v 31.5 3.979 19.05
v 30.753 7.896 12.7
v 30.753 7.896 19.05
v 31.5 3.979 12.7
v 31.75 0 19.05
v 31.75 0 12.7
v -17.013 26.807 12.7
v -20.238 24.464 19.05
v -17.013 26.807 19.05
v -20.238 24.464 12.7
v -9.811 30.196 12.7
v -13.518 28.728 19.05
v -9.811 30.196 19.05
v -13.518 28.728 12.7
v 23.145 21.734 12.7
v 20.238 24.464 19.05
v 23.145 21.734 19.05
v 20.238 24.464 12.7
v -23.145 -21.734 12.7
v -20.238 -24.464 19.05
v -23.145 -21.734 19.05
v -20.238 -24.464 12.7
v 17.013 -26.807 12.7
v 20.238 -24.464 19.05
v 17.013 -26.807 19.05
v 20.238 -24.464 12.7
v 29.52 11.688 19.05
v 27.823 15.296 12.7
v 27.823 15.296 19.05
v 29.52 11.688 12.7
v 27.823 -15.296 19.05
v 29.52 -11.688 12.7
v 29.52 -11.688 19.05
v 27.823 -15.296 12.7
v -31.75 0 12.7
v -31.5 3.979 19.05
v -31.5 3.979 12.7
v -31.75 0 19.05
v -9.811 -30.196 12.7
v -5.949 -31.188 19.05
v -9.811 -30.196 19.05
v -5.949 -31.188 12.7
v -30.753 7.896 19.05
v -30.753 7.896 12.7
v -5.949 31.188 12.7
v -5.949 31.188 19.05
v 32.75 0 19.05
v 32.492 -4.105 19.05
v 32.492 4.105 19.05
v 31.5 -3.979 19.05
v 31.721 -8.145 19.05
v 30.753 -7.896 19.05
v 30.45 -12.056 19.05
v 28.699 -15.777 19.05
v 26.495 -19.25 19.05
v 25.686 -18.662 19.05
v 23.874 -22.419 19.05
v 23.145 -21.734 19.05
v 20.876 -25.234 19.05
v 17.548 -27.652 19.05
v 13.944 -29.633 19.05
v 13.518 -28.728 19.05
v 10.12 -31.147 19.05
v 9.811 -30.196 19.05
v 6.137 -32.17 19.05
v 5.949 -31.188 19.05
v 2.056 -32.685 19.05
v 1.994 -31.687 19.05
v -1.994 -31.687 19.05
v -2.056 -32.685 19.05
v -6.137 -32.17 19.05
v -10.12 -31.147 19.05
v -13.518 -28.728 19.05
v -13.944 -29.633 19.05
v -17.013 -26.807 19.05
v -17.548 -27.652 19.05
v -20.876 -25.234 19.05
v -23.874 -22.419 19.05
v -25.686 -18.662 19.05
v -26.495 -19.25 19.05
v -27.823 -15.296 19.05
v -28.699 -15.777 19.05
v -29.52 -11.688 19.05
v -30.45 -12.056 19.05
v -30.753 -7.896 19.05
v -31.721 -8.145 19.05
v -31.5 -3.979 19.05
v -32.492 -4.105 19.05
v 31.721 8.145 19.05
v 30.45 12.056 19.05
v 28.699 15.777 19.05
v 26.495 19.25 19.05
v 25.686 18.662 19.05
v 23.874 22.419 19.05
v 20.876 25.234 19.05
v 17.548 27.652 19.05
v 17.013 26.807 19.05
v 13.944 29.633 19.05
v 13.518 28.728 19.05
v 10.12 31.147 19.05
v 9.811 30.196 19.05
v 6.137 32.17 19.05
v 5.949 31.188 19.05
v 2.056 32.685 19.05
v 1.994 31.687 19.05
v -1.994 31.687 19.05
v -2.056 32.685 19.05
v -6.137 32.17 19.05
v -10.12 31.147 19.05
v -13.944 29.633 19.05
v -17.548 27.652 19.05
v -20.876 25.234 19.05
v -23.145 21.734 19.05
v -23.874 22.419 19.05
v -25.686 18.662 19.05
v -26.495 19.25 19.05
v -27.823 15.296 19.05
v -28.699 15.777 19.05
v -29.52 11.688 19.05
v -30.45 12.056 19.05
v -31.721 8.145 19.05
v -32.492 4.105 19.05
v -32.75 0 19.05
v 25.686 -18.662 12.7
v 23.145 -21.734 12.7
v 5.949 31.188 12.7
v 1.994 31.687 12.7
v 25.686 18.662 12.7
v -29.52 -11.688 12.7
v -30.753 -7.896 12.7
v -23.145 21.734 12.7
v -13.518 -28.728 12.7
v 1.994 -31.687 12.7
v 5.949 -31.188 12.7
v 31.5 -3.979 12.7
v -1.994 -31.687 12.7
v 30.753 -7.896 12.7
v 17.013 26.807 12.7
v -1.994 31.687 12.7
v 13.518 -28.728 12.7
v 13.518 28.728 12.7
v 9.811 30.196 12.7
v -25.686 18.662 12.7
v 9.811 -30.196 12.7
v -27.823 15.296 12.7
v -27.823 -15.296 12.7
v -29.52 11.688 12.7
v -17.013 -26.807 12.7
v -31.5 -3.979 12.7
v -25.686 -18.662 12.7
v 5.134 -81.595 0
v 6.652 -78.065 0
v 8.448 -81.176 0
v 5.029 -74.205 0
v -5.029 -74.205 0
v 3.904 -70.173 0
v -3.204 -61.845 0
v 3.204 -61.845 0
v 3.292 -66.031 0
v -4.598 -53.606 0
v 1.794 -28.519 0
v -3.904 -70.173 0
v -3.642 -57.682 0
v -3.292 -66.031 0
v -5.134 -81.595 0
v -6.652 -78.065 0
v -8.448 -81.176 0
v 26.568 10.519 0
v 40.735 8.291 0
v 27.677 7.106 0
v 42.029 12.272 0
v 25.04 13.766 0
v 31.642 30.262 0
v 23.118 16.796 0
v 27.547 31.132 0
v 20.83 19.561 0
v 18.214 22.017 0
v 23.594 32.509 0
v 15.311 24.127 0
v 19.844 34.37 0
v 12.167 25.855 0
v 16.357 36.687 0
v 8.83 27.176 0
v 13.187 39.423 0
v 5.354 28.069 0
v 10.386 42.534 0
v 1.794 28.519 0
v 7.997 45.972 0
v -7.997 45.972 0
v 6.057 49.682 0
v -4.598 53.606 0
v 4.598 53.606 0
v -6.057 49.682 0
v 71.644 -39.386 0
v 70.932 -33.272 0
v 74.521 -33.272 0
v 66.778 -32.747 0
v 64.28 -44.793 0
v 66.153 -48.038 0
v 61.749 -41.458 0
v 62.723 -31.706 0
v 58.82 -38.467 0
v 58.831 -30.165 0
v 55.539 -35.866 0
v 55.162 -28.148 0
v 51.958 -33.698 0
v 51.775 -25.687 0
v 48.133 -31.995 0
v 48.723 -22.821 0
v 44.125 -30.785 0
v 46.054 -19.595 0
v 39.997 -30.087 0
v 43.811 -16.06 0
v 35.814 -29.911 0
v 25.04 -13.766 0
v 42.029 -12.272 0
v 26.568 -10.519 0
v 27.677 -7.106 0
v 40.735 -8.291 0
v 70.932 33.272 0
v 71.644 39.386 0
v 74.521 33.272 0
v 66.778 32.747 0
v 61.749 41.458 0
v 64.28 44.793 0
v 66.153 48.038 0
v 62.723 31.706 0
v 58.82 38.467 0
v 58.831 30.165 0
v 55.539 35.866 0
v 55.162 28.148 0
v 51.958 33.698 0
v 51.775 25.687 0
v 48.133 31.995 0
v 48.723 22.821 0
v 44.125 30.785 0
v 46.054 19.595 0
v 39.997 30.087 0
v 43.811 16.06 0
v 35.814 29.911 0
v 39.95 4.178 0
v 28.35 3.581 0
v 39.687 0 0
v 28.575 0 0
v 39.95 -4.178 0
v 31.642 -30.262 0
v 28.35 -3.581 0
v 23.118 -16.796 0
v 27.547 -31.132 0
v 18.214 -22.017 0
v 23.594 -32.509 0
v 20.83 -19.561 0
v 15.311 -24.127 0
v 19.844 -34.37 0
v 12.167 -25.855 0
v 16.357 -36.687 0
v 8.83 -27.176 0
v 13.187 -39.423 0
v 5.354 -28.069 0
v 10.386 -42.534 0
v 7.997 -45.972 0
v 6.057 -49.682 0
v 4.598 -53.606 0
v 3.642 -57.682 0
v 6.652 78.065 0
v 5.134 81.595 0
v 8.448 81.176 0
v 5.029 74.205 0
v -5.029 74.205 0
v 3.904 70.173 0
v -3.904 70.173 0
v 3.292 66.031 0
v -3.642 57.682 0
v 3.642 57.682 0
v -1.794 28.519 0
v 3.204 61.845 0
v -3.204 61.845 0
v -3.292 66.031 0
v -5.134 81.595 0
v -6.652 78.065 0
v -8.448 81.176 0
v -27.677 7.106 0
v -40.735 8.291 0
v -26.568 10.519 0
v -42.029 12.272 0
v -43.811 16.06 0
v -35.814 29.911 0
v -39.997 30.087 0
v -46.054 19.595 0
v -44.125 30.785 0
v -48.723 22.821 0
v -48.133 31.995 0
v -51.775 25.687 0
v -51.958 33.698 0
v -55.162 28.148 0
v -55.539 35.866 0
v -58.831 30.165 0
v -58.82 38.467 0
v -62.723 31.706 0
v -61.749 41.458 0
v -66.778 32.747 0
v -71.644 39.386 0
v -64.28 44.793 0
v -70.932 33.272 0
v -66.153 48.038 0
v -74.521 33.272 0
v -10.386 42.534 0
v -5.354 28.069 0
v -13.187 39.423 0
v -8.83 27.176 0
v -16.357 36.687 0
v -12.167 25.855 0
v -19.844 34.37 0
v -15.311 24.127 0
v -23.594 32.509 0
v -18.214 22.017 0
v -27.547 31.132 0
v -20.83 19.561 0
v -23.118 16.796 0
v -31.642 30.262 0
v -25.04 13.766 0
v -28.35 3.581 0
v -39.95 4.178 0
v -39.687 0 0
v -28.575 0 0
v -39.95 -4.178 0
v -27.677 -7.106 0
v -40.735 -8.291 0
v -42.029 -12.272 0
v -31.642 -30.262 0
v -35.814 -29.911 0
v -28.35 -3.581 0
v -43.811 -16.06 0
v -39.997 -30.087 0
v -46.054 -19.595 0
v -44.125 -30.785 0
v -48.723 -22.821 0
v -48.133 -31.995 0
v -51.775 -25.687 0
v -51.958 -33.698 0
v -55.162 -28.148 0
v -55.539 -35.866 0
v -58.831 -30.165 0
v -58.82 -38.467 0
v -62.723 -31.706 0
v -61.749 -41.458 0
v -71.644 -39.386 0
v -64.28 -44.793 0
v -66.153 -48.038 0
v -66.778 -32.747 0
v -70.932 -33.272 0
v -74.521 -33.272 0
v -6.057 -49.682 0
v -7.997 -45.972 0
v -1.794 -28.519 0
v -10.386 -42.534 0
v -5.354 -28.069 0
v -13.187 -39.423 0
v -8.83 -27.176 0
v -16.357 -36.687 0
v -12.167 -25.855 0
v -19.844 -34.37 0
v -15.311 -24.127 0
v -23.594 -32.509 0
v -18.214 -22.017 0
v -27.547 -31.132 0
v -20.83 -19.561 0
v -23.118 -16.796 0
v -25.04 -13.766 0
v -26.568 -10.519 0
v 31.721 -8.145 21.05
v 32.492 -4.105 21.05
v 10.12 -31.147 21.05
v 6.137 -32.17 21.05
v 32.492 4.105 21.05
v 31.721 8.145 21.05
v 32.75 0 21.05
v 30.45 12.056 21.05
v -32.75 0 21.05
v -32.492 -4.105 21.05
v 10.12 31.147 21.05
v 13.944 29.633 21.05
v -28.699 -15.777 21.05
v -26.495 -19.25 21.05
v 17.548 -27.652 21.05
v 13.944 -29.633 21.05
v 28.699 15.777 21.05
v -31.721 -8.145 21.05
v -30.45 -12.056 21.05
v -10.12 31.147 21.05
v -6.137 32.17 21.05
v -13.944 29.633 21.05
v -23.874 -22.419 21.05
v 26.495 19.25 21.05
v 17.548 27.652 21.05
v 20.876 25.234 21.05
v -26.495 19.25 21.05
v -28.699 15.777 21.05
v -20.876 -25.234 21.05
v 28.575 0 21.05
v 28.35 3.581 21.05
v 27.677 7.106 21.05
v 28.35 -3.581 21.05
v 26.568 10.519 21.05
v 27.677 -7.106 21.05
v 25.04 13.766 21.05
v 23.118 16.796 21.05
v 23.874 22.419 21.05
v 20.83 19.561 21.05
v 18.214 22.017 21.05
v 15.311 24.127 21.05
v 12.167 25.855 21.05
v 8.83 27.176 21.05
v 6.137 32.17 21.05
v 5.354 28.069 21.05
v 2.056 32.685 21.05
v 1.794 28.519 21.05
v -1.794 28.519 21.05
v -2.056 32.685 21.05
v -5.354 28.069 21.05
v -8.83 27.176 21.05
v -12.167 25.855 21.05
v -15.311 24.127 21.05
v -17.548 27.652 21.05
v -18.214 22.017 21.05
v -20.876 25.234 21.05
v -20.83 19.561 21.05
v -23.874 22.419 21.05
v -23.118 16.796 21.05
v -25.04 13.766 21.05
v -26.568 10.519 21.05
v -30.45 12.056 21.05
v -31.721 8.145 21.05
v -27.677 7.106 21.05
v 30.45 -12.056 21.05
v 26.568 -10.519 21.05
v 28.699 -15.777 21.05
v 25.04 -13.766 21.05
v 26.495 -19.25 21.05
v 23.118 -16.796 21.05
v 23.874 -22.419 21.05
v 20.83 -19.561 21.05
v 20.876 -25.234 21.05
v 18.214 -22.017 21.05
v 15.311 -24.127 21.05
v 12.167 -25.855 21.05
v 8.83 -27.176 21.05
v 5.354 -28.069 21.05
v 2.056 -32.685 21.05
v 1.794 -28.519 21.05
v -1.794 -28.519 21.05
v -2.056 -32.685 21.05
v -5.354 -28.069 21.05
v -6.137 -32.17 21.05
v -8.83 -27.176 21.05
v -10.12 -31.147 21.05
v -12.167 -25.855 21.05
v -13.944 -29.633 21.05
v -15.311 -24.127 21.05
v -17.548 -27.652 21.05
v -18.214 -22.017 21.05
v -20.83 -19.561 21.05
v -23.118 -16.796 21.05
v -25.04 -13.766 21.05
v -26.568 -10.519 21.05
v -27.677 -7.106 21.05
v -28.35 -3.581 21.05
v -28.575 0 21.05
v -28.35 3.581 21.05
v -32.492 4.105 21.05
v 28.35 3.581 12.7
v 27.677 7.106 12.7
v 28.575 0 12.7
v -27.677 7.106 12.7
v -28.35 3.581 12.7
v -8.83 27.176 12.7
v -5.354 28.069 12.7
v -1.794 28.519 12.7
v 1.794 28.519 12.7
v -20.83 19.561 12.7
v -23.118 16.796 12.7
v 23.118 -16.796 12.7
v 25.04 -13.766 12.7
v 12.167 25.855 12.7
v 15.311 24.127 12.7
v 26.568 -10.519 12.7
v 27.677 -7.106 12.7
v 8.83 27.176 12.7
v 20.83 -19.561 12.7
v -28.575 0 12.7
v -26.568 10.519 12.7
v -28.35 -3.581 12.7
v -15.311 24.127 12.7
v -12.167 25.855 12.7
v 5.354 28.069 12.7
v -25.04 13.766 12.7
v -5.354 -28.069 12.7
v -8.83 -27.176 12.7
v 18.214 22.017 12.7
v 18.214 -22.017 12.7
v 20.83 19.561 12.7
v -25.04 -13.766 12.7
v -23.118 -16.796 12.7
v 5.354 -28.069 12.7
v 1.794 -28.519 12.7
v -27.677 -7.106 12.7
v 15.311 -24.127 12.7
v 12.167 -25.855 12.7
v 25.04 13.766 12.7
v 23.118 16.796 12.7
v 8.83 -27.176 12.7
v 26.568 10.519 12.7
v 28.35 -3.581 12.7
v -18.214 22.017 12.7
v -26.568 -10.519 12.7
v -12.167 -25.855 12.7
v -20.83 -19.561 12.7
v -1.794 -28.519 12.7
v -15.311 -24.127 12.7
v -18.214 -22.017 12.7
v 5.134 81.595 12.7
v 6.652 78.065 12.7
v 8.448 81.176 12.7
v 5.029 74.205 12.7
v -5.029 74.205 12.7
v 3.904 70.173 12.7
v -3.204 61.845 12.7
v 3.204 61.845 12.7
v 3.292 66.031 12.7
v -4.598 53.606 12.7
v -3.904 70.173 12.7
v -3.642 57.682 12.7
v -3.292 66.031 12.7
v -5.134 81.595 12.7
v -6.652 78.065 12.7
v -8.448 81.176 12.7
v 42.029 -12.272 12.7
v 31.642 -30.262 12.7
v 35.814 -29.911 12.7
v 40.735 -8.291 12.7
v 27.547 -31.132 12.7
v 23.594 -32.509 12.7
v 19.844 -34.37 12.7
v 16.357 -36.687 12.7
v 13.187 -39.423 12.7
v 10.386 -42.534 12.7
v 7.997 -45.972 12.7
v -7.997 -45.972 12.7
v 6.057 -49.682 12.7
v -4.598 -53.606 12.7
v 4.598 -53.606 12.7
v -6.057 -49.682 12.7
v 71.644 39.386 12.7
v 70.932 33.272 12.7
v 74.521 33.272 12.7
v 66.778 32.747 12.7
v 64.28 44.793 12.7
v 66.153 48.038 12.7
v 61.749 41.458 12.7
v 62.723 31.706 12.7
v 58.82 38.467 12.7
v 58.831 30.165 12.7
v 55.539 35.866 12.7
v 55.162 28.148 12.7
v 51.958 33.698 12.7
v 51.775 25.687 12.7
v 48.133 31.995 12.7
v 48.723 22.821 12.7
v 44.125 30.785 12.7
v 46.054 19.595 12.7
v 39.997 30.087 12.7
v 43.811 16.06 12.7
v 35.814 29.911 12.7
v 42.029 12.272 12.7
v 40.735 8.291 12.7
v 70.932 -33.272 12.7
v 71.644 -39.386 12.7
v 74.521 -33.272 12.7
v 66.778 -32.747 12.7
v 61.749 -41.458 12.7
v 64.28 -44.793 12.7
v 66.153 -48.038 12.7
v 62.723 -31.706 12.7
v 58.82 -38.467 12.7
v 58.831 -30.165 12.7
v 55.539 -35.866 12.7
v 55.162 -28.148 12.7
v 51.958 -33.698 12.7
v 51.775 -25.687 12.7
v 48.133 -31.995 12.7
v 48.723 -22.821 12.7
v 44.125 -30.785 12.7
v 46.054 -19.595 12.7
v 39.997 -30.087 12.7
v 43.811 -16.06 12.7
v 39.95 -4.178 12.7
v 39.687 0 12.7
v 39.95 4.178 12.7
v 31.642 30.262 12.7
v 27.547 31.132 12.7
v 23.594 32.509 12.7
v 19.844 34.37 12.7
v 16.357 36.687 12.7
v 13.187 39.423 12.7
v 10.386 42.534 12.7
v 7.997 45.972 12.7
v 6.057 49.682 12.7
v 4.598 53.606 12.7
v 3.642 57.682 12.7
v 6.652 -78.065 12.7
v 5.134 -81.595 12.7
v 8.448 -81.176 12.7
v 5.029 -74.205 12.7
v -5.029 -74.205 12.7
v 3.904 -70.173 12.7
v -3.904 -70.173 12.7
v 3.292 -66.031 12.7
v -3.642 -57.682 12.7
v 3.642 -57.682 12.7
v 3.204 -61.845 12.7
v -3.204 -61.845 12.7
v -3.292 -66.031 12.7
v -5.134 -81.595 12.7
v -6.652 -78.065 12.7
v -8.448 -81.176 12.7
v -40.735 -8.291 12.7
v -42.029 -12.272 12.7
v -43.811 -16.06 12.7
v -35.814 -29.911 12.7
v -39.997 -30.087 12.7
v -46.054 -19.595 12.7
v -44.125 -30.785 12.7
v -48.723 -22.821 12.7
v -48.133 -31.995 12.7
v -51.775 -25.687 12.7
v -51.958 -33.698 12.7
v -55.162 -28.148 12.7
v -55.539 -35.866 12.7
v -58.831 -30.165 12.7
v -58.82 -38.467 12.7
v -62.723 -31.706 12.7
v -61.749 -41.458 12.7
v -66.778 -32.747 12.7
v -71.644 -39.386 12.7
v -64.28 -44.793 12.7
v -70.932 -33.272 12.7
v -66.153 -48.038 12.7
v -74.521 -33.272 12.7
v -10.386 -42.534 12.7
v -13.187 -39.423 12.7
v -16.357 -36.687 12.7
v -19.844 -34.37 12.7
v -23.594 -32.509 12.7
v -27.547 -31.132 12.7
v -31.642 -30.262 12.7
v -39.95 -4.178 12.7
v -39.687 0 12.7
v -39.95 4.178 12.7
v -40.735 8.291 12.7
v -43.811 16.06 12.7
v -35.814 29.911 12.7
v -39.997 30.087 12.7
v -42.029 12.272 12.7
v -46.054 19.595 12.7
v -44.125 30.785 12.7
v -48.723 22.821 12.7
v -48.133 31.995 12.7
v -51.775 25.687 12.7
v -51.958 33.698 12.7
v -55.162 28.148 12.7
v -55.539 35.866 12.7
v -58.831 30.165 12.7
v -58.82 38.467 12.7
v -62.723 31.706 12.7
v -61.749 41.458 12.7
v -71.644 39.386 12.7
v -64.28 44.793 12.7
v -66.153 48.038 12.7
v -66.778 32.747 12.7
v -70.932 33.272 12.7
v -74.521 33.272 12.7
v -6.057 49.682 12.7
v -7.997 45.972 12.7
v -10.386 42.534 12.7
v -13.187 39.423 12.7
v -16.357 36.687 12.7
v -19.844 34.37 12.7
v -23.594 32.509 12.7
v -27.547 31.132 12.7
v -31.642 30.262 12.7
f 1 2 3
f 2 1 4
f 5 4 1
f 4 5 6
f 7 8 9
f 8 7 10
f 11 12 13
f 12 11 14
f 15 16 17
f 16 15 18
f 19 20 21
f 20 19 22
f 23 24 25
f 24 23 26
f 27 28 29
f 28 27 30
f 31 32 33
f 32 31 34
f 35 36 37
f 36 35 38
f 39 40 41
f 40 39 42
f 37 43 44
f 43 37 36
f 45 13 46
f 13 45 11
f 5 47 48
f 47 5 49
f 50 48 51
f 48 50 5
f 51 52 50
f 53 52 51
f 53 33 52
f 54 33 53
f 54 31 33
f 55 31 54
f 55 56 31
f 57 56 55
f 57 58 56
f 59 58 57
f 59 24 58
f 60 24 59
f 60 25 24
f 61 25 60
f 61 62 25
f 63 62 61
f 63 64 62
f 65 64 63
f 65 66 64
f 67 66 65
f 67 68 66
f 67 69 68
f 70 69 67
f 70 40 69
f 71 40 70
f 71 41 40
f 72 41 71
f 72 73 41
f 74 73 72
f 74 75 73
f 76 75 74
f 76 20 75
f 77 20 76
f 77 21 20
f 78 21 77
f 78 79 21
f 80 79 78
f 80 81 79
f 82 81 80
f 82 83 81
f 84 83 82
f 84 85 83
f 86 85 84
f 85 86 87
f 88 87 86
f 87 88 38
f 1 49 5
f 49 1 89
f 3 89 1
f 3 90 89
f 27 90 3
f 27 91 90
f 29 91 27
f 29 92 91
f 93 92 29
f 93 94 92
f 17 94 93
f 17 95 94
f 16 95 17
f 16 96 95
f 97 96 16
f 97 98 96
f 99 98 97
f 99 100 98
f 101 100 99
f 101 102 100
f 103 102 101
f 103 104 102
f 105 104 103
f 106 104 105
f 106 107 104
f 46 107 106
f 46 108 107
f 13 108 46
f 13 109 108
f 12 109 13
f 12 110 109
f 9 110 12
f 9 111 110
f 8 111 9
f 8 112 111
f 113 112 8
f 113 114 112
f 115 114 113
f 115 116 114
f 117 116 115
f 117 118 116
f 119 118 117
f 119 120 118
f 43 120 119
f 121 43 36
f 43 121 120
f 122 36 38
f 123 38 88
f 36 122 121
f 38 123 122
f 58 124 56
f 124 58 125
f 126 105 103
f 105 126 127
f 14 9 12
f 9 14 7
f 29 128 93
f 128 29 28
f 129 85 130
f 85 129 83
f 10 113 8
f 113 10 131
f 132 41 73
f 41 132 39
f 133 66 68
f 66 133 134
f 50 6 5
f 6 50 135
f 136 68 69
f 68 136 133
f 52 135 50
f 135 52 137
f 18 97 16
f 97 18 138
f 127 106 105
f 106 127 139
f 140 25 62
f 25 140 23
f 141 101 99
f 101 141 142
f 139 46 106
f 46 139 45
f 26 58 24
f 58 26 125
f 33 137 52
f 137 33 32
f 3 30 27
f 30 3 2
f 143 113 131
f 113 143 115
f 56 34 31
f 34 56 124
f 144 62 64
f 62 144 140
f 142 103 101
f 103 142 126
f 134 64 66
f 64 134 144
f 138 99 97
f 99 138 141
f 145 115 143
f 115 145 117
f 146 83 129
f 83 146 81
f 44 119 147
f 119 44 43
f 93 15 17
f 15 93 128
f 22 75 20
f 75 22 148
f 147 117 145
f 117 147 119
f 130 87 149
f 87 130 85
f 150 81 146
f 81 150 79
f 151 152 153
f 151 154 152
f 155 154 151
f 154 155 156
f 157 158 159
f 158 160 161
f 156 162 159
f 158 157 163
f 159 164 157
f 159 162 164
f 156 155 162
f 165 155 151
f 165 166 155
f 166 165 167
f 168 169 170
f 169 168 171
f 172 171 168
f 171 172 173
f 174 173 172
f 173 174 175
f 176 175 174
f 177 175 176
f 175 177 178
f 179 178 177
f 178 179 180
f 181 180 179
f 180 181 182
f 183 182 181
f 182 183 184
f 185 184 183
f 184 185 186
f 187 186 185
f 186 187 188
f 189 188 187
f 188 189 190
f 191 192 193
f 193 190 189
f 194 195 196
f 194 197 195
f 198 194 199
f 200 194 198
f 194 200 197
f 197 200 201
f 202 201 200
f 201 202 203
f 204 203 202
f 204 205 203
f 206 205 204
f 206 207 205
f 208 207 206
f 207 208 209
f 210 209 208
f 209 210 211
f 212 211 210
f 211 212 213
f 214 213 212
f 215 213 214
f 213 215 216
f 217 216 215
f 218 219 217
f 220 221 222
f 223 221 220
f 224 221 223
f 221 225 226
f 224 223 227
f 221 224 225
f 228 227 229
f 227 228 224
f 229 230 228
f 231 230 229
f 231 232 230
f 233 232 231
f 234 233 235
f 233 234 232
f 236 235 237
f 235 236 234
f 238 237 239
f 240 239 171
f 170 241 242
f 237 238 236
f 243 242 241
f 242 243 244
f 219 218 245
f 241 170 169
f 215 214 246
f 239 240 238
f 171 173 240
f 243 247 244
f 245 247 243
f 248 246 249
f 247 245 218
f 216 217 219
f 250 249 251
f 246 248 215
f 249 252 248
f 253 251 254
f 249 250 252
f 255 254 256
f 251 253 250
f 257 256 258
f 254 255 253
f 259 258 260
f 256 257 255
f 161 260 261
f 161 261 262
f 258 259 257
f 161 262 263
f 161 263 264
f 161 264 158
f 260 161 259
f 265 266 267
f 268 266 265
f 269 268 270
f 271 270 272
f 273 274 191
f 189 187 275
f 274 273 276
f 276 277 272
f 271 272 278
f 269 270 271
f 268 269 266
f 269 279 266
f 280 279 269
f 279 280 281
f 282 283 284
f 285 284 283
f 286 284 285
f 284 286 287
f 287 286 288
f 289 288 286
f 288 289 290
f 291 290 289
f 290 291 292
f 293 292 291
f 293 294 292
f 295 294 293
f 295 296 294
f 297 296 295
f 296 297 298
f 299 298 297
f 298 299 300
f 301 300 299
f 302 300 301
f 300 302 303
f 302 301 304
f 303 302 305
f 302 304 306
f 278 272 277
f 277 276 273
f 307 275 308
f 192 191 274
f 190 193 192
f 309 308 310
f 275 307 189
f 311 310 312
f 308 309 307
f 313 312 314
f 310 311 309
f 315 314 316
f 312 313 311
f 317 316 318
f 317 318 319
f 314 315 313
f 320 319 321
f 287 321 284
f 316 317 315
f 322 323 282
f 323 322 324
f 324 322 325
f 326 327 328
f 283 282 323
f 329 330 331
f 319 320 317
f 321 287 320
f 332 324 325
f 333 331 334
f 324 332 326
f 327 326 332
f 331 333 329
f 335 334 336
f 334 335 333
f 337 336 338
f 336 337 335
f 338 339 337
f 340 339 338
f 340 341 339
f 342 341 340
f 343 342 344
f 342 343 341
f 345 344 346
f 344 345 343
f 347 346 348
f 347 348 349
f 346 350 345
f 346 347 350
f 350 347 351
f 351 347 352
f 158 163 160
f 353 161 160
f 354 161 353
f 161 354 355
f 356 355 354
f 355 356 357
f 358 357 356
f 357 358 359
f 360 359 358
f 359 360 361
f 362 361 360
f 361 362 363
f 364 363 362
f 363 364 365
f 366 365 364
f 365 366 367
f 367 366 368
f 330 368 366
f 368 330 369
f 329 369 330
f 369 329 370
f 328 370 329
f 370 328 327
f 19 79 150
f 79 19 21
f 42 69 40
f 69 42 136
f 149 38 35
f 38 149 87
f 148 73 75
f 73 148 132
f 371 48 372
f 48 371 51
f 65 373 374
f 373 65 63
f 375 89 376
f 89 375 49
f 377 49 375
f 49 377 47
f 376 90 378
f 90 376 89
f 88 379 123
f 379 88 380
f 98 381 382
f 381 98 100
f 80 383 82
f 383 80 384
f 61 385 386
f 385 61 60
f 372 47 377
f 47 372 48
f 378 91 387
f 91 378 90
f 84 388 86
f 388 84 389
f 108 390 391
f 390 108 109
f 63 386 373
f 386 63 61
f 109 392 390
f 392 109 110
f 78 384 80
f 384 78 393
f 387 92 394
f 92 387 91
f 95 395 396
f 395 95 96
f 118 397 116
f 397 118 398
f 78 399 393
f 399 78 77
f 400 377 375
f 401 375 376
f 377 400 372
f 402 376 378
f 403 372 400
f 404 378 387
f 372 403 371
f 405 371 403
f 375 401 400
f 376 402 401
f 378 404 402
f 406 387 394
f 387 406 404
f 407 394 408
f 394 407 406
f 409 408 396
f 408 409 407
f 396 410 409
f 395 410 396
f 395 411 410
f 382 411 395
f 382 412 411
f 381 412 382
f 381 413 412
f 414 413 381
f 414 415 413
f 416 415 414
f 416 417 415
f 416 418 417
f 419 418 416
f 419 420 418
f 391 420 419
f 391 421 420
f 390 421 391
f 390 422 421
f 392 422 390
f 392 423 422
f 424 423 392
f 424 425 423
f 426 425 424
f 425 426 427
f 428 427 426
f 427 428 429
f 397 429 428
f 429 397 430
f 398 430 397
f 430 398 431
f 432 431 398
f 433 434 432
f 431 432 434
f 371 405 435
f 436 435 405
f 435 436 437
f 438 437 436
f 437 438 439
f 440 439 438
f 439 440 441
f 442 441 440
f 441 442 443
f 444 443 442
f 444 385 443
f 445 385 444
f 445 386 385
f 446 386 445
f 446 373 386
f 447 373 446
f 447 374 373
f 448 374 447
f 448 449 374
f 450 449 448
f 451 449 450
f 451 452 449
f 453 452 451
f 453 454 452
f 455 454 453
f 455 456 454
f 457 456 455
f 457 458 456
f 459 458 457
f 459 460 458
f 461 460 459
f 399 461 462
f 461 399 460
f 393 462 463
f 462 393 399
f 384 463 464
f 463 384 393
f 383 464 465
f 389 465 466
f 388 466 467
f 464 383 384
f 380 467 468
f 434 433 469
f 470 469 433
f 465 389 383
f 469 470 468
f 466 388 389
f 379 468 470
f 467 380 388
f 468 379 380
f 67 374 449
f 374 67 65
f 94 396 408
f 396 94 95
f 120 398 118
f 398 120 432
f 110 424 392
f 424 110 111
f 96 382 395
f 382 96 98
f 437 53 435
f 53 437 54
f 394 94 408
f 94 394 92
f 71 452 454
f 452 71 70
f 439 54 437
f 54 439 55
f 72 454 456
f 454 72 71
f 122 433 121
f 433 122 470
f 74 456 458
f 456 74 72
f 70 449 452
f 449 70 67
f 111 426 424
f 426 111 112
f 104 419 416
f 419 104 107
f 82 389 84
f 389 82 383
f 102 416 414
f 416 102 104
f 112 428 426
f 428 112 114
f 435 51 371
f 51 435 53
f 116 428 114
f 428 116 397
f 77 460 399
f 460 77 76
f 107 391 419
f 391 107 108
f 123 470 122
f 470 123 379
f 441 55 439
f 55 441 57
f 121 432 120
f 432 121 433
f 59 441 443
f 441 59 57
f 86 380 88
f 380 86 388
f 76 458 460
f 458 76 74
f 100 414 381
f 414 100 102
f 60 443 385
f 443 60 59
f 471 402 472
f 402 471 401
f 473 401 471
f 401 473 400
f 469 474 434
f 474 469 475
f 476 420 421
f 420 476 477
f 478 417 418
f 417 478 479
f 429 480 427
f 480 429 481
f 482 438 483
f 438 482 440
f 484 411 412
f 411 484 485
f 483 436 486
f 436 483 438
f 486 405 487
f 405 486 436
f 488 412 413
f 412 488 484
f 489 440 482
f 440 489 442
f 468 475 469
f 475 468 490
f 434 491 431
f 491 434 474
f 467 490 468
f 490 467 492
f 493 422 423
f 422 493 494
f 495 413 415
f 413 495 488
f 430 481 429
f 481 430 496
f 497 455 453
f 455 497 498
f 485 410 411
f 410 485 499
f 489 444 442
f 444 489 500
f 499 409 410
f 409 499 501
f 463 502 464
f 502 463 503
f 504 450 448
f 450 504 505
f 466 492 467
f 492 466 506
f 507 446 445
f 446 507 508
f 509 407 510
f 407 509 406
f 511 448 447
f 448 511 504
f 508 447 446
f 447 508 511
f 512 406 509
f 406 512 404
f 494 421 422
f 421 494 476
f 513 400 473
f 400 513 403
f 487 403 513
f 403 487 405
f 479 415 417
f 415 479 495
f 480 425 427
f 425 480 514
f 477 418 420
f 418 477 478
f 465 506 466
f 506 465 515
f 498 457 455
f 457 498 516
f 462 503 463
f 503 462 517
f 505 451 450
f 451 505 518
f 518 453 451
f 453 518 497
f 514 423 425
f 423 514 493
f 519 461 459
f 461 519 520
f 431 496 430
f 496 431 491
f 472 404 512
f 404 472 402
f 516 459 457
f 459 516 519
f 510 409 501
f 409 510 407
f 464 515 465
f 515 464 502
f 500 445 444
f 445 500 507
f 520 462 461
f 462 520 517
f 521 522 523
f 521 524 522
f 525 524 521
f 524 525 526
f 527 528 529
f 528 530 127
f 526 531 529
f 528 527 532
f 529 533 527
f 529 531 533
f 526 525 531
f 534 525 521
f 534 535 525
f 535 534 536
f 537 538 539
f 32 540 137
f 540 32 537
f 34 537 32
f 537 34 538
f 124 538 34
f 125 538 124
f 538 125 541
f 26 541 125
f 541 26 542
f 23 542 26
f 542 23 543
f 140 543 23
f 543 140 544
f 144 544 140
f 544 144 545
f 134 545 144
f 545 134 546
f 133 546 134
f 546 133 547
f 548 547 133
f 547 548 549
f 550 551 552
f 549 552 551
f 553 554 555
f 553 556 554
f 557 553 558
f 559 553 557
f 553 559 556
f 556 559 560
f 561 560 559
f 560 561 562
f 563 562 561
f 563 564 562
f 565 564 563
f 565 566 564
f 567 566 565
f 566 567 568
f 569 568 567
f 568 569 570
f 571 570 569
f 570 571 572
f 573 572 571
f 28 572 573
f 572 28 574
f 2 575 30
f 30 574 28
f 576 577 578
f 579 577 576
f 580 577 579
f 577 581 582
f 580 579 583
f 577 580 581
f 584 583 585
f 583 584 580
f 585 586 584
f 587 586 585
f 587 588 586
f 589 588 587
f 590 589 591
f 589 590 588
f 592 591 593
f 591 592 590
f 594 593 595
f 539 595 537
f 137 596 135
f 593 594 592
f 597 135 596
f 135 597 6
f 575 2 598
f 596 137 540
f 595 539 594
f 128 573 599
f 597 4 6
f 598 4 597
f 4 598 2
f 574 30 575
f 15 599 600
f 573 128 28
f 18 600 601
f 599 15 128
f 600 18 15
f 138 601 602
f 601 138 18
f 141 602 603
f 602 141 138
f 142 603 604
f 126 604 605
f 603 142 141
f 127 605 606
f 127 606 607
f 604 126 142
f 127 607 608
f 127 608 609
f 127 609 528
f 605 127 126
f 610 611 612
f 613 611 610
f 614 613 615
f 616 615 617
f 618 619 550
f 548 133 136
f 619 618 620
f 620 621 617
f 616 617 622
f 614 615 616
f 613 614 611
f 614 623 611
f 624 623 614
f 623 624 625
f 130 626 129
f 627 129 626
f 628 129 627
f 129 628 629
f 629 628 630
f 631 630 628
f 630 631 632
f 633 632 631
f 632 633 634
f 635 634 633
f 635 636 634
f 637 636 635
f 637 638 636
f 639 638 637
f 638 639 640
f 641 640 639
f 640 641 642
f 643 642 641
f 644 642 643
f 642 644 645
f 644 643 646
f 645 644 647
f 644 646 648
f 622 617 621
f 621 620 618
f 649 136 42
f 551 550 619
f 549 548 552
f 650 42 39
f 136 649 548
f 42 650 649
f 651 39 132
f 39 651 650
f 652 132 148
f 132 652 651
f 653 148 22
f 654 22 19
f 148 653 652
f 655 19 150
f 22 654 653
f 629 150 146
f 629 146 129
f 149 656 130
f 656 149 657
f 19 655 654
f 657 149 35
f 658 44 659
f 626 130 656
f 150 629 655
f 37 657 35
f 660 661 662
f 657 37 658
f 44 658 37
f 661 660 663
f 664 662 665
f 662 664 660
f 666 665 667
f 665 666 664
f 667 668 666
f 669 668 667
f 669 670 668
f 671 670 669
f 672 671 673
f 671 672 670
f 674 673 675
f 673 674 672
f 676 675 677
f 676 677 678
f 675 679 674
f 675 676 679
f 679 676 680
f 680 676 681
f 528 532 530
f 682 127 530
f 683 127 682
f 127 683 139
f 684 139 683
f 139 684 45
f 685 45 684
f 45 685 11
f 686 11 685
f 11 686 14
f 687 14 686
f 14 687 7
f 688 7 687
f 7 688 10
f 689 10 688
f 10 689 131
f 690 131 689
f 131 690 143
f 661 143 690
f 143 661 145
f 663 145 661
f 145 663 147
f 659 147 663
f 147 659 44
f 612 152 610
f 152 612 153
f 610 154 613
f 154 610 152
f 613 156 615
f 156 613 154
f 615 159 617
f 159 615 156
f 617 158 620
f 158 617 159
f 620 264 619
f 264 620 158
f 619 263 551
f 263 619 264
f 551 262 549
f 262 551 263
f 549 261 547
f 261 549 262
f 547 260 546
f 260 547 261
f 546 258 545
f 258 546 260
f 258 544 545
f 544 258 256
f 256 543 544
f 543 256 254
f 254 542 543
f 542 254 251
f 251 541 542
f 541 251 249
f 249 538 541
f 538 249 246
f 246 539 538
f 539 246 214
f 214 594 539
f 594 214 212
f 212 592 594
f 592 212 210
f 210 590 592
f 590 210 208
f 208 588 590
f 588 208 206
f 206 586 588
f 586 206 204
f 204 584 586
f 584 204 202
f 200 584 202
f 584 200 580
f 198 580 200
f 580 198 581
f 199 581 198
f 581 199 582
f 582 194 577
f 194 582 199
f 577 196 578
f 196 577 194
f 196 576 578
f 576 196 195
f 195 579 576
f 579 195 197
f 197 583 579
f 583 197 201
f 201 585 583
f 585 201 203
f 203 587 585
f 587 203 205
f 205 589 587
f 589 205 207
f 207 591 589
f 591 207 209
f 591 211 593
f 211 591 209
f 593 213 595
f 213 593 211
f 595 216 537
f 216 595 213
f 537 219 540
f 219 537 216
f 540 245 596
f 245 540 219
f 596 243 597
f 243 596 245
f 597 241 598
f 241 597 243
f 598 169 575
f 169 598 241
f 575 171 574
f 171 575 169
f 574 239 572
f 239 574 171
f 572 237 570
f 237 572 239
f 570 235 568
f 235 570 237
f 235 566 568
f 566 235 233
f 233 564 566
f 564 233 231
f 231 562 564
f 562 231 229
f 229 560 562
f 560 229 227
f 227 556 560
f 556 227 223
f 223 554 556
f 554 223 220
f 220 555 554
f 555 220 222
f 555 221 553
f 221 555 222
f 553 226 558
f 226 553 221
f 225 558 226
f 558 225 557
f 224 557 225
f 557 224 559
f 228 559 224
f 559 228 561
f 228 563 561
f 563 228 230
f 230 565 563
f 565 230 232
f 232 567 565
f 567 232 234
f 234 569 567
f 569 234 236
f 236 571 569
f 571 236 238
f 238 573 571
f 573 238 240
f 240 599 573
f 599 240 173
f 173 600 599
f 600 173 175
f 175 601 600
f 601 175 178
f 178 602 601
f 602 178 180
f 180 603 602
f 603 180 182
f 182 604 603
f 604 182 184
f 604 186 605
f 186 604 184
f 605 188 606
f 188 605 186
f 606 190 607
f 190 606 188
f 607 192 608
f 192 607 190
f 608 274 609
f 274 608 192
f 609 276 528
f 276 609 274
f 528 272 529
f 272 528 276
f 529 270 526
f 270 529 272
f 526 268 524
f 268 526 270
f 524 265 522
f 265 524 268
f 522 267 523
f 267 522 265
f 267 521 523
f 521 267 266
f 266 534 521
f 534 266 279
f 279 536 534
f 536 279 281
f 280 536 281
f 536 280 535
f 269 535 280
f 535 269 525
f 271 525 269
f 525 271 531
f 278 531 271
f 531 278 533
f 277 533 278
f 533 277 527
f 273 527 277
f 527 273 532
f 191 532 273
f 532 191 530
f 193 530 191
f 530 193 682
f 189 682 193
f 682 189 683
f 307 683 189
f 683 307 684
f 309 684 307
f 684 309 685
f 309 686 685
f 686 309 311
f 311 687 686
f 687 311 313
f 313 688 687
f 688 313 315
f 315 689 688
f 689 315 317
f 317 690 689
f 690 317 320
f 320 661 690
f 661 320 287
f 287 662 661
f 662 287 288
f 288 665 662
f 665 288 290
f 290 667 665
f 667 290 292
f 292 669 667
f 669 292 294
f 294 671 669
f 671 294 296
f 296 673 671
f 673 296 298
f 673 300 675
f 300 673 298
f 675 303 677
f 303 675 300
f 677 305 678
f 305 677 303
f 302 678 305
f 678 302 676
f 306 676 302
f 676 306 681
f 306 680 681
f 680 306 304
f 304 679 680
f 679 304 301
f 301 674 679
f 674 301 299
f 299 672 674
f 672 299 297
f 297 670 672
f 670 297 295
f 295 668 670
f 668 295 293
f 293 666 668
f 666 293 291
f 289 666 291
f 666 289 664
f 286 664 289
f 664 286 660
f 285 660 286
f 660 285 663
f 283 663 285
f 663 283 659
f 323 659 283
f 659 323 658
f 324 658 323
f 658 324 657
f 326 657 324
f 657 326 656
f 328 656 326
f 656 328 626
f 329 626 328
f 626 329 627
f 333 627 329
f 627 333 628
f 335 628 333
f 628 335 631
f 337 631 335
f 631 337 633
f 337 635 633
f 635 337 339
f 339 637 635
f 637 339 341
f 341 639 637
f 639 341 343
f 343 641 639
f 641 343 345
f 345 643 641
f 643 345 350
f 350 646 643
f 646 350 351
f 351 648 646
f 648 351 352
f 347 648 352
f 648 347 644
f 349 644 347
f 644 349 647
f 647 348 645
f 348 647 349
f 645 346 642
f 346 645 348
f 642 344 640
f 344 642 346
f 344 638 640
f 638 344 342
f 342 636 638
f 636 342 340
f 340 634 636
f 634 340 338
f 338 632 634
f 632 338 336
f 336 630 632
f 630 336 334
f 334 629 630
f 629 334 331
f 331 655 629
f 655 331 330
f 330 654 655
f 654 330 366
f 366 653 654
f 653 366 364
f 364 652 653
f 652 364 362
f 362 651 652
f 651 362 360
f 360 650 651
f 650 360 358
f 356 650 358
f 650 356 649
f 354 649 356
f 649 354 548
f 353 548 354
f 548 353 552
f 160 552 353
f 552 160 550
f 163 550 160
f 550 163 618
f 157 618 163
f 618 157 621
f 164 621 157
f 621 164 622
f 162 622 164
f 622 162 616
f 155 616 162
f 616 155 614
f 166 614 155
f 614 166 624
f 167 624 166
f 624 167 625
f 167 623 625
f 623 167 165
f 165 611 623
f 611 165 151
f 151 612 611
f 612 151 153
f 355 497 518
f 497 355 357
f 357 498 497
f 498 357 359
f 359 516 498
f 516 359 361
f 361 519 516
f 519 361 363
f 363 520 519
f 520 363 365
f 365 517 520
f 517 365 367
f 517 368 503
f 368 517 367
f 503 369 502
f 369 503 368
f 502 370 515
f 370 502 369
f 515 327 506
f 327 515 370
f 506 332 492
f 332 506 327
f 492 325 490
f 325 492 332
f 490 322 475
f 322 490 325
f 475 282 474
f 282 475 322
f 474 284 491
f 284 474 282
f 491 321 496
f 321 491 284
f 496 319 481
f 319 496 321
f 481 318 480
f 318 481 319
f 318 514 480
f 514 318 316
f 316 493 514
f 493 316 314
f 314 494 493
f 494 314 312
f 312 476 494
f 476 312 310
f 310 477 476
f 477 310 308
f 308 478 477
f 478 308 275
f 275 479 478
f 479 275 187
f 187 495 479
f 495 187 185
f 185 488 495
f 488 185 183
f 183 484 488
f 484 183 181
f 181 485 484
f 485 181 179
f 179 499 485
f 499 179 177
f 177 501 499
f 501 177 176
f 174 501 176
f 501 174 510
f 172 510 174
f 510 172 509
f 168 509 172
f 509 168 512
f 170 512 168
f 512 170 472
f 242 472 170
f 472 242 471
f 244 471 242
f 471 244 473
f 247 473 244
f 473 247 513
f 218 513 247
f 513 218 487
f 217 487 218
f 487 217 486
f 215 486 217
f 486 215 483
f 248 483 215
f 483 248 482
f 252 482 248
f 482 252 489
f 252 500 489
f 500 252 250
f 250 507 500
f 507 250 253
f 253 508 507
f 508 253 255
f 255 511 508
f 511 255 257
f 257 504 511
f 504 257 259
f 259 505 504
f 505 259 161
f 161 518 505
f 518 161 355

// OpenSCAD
//bracket that slips over a pneumatic cylinder of size cyl_od
// and attaches 6 clippard tanks to it
// print 2, slip over cylinder 
in=25.4;
cyl_od = (2+1/4)*in;    //add extra for foam tape
h=.5*in;

tank_od = 2.5*in + in*1/8;  //add extra for foam tape
tank_space = .25*in;

zip=.25*in;
lip=2; // lip to hold on zip tie

$fn=50;
difference() {
union() {
    // create a spot for a zip tie
difference() {
    union() {
        cylinder(d=cyl_od+tank_space, h=h+zip);
        translate([0,0,h+zip]) cylinder(d=cyl_od+tank_space+lip, h=lip);
    }
    cylinder(d=cyl_od, h=h+zip+lip);
}

linear_extrude(h) {
    difference() {
        circle(d=cyl_od+tank_space+1.5*tank_od); // chop the whole thing
        
        circle(d=cyl_od);   //main cylinder
        
        for (a=[0:60:359]) {
            rotate([0,0,a]) 
                translate([(tank_od+tank_space), 0, 0])
                    circle(d=tank_od, h=h);
        }
    }
}
}
*translate([-(cyl_od+tank_od+tank_space)/2, -0.5, 0])
   # cube([(cyl_od+tank_od+tank_space), 1, h+zip+lip]);
}
